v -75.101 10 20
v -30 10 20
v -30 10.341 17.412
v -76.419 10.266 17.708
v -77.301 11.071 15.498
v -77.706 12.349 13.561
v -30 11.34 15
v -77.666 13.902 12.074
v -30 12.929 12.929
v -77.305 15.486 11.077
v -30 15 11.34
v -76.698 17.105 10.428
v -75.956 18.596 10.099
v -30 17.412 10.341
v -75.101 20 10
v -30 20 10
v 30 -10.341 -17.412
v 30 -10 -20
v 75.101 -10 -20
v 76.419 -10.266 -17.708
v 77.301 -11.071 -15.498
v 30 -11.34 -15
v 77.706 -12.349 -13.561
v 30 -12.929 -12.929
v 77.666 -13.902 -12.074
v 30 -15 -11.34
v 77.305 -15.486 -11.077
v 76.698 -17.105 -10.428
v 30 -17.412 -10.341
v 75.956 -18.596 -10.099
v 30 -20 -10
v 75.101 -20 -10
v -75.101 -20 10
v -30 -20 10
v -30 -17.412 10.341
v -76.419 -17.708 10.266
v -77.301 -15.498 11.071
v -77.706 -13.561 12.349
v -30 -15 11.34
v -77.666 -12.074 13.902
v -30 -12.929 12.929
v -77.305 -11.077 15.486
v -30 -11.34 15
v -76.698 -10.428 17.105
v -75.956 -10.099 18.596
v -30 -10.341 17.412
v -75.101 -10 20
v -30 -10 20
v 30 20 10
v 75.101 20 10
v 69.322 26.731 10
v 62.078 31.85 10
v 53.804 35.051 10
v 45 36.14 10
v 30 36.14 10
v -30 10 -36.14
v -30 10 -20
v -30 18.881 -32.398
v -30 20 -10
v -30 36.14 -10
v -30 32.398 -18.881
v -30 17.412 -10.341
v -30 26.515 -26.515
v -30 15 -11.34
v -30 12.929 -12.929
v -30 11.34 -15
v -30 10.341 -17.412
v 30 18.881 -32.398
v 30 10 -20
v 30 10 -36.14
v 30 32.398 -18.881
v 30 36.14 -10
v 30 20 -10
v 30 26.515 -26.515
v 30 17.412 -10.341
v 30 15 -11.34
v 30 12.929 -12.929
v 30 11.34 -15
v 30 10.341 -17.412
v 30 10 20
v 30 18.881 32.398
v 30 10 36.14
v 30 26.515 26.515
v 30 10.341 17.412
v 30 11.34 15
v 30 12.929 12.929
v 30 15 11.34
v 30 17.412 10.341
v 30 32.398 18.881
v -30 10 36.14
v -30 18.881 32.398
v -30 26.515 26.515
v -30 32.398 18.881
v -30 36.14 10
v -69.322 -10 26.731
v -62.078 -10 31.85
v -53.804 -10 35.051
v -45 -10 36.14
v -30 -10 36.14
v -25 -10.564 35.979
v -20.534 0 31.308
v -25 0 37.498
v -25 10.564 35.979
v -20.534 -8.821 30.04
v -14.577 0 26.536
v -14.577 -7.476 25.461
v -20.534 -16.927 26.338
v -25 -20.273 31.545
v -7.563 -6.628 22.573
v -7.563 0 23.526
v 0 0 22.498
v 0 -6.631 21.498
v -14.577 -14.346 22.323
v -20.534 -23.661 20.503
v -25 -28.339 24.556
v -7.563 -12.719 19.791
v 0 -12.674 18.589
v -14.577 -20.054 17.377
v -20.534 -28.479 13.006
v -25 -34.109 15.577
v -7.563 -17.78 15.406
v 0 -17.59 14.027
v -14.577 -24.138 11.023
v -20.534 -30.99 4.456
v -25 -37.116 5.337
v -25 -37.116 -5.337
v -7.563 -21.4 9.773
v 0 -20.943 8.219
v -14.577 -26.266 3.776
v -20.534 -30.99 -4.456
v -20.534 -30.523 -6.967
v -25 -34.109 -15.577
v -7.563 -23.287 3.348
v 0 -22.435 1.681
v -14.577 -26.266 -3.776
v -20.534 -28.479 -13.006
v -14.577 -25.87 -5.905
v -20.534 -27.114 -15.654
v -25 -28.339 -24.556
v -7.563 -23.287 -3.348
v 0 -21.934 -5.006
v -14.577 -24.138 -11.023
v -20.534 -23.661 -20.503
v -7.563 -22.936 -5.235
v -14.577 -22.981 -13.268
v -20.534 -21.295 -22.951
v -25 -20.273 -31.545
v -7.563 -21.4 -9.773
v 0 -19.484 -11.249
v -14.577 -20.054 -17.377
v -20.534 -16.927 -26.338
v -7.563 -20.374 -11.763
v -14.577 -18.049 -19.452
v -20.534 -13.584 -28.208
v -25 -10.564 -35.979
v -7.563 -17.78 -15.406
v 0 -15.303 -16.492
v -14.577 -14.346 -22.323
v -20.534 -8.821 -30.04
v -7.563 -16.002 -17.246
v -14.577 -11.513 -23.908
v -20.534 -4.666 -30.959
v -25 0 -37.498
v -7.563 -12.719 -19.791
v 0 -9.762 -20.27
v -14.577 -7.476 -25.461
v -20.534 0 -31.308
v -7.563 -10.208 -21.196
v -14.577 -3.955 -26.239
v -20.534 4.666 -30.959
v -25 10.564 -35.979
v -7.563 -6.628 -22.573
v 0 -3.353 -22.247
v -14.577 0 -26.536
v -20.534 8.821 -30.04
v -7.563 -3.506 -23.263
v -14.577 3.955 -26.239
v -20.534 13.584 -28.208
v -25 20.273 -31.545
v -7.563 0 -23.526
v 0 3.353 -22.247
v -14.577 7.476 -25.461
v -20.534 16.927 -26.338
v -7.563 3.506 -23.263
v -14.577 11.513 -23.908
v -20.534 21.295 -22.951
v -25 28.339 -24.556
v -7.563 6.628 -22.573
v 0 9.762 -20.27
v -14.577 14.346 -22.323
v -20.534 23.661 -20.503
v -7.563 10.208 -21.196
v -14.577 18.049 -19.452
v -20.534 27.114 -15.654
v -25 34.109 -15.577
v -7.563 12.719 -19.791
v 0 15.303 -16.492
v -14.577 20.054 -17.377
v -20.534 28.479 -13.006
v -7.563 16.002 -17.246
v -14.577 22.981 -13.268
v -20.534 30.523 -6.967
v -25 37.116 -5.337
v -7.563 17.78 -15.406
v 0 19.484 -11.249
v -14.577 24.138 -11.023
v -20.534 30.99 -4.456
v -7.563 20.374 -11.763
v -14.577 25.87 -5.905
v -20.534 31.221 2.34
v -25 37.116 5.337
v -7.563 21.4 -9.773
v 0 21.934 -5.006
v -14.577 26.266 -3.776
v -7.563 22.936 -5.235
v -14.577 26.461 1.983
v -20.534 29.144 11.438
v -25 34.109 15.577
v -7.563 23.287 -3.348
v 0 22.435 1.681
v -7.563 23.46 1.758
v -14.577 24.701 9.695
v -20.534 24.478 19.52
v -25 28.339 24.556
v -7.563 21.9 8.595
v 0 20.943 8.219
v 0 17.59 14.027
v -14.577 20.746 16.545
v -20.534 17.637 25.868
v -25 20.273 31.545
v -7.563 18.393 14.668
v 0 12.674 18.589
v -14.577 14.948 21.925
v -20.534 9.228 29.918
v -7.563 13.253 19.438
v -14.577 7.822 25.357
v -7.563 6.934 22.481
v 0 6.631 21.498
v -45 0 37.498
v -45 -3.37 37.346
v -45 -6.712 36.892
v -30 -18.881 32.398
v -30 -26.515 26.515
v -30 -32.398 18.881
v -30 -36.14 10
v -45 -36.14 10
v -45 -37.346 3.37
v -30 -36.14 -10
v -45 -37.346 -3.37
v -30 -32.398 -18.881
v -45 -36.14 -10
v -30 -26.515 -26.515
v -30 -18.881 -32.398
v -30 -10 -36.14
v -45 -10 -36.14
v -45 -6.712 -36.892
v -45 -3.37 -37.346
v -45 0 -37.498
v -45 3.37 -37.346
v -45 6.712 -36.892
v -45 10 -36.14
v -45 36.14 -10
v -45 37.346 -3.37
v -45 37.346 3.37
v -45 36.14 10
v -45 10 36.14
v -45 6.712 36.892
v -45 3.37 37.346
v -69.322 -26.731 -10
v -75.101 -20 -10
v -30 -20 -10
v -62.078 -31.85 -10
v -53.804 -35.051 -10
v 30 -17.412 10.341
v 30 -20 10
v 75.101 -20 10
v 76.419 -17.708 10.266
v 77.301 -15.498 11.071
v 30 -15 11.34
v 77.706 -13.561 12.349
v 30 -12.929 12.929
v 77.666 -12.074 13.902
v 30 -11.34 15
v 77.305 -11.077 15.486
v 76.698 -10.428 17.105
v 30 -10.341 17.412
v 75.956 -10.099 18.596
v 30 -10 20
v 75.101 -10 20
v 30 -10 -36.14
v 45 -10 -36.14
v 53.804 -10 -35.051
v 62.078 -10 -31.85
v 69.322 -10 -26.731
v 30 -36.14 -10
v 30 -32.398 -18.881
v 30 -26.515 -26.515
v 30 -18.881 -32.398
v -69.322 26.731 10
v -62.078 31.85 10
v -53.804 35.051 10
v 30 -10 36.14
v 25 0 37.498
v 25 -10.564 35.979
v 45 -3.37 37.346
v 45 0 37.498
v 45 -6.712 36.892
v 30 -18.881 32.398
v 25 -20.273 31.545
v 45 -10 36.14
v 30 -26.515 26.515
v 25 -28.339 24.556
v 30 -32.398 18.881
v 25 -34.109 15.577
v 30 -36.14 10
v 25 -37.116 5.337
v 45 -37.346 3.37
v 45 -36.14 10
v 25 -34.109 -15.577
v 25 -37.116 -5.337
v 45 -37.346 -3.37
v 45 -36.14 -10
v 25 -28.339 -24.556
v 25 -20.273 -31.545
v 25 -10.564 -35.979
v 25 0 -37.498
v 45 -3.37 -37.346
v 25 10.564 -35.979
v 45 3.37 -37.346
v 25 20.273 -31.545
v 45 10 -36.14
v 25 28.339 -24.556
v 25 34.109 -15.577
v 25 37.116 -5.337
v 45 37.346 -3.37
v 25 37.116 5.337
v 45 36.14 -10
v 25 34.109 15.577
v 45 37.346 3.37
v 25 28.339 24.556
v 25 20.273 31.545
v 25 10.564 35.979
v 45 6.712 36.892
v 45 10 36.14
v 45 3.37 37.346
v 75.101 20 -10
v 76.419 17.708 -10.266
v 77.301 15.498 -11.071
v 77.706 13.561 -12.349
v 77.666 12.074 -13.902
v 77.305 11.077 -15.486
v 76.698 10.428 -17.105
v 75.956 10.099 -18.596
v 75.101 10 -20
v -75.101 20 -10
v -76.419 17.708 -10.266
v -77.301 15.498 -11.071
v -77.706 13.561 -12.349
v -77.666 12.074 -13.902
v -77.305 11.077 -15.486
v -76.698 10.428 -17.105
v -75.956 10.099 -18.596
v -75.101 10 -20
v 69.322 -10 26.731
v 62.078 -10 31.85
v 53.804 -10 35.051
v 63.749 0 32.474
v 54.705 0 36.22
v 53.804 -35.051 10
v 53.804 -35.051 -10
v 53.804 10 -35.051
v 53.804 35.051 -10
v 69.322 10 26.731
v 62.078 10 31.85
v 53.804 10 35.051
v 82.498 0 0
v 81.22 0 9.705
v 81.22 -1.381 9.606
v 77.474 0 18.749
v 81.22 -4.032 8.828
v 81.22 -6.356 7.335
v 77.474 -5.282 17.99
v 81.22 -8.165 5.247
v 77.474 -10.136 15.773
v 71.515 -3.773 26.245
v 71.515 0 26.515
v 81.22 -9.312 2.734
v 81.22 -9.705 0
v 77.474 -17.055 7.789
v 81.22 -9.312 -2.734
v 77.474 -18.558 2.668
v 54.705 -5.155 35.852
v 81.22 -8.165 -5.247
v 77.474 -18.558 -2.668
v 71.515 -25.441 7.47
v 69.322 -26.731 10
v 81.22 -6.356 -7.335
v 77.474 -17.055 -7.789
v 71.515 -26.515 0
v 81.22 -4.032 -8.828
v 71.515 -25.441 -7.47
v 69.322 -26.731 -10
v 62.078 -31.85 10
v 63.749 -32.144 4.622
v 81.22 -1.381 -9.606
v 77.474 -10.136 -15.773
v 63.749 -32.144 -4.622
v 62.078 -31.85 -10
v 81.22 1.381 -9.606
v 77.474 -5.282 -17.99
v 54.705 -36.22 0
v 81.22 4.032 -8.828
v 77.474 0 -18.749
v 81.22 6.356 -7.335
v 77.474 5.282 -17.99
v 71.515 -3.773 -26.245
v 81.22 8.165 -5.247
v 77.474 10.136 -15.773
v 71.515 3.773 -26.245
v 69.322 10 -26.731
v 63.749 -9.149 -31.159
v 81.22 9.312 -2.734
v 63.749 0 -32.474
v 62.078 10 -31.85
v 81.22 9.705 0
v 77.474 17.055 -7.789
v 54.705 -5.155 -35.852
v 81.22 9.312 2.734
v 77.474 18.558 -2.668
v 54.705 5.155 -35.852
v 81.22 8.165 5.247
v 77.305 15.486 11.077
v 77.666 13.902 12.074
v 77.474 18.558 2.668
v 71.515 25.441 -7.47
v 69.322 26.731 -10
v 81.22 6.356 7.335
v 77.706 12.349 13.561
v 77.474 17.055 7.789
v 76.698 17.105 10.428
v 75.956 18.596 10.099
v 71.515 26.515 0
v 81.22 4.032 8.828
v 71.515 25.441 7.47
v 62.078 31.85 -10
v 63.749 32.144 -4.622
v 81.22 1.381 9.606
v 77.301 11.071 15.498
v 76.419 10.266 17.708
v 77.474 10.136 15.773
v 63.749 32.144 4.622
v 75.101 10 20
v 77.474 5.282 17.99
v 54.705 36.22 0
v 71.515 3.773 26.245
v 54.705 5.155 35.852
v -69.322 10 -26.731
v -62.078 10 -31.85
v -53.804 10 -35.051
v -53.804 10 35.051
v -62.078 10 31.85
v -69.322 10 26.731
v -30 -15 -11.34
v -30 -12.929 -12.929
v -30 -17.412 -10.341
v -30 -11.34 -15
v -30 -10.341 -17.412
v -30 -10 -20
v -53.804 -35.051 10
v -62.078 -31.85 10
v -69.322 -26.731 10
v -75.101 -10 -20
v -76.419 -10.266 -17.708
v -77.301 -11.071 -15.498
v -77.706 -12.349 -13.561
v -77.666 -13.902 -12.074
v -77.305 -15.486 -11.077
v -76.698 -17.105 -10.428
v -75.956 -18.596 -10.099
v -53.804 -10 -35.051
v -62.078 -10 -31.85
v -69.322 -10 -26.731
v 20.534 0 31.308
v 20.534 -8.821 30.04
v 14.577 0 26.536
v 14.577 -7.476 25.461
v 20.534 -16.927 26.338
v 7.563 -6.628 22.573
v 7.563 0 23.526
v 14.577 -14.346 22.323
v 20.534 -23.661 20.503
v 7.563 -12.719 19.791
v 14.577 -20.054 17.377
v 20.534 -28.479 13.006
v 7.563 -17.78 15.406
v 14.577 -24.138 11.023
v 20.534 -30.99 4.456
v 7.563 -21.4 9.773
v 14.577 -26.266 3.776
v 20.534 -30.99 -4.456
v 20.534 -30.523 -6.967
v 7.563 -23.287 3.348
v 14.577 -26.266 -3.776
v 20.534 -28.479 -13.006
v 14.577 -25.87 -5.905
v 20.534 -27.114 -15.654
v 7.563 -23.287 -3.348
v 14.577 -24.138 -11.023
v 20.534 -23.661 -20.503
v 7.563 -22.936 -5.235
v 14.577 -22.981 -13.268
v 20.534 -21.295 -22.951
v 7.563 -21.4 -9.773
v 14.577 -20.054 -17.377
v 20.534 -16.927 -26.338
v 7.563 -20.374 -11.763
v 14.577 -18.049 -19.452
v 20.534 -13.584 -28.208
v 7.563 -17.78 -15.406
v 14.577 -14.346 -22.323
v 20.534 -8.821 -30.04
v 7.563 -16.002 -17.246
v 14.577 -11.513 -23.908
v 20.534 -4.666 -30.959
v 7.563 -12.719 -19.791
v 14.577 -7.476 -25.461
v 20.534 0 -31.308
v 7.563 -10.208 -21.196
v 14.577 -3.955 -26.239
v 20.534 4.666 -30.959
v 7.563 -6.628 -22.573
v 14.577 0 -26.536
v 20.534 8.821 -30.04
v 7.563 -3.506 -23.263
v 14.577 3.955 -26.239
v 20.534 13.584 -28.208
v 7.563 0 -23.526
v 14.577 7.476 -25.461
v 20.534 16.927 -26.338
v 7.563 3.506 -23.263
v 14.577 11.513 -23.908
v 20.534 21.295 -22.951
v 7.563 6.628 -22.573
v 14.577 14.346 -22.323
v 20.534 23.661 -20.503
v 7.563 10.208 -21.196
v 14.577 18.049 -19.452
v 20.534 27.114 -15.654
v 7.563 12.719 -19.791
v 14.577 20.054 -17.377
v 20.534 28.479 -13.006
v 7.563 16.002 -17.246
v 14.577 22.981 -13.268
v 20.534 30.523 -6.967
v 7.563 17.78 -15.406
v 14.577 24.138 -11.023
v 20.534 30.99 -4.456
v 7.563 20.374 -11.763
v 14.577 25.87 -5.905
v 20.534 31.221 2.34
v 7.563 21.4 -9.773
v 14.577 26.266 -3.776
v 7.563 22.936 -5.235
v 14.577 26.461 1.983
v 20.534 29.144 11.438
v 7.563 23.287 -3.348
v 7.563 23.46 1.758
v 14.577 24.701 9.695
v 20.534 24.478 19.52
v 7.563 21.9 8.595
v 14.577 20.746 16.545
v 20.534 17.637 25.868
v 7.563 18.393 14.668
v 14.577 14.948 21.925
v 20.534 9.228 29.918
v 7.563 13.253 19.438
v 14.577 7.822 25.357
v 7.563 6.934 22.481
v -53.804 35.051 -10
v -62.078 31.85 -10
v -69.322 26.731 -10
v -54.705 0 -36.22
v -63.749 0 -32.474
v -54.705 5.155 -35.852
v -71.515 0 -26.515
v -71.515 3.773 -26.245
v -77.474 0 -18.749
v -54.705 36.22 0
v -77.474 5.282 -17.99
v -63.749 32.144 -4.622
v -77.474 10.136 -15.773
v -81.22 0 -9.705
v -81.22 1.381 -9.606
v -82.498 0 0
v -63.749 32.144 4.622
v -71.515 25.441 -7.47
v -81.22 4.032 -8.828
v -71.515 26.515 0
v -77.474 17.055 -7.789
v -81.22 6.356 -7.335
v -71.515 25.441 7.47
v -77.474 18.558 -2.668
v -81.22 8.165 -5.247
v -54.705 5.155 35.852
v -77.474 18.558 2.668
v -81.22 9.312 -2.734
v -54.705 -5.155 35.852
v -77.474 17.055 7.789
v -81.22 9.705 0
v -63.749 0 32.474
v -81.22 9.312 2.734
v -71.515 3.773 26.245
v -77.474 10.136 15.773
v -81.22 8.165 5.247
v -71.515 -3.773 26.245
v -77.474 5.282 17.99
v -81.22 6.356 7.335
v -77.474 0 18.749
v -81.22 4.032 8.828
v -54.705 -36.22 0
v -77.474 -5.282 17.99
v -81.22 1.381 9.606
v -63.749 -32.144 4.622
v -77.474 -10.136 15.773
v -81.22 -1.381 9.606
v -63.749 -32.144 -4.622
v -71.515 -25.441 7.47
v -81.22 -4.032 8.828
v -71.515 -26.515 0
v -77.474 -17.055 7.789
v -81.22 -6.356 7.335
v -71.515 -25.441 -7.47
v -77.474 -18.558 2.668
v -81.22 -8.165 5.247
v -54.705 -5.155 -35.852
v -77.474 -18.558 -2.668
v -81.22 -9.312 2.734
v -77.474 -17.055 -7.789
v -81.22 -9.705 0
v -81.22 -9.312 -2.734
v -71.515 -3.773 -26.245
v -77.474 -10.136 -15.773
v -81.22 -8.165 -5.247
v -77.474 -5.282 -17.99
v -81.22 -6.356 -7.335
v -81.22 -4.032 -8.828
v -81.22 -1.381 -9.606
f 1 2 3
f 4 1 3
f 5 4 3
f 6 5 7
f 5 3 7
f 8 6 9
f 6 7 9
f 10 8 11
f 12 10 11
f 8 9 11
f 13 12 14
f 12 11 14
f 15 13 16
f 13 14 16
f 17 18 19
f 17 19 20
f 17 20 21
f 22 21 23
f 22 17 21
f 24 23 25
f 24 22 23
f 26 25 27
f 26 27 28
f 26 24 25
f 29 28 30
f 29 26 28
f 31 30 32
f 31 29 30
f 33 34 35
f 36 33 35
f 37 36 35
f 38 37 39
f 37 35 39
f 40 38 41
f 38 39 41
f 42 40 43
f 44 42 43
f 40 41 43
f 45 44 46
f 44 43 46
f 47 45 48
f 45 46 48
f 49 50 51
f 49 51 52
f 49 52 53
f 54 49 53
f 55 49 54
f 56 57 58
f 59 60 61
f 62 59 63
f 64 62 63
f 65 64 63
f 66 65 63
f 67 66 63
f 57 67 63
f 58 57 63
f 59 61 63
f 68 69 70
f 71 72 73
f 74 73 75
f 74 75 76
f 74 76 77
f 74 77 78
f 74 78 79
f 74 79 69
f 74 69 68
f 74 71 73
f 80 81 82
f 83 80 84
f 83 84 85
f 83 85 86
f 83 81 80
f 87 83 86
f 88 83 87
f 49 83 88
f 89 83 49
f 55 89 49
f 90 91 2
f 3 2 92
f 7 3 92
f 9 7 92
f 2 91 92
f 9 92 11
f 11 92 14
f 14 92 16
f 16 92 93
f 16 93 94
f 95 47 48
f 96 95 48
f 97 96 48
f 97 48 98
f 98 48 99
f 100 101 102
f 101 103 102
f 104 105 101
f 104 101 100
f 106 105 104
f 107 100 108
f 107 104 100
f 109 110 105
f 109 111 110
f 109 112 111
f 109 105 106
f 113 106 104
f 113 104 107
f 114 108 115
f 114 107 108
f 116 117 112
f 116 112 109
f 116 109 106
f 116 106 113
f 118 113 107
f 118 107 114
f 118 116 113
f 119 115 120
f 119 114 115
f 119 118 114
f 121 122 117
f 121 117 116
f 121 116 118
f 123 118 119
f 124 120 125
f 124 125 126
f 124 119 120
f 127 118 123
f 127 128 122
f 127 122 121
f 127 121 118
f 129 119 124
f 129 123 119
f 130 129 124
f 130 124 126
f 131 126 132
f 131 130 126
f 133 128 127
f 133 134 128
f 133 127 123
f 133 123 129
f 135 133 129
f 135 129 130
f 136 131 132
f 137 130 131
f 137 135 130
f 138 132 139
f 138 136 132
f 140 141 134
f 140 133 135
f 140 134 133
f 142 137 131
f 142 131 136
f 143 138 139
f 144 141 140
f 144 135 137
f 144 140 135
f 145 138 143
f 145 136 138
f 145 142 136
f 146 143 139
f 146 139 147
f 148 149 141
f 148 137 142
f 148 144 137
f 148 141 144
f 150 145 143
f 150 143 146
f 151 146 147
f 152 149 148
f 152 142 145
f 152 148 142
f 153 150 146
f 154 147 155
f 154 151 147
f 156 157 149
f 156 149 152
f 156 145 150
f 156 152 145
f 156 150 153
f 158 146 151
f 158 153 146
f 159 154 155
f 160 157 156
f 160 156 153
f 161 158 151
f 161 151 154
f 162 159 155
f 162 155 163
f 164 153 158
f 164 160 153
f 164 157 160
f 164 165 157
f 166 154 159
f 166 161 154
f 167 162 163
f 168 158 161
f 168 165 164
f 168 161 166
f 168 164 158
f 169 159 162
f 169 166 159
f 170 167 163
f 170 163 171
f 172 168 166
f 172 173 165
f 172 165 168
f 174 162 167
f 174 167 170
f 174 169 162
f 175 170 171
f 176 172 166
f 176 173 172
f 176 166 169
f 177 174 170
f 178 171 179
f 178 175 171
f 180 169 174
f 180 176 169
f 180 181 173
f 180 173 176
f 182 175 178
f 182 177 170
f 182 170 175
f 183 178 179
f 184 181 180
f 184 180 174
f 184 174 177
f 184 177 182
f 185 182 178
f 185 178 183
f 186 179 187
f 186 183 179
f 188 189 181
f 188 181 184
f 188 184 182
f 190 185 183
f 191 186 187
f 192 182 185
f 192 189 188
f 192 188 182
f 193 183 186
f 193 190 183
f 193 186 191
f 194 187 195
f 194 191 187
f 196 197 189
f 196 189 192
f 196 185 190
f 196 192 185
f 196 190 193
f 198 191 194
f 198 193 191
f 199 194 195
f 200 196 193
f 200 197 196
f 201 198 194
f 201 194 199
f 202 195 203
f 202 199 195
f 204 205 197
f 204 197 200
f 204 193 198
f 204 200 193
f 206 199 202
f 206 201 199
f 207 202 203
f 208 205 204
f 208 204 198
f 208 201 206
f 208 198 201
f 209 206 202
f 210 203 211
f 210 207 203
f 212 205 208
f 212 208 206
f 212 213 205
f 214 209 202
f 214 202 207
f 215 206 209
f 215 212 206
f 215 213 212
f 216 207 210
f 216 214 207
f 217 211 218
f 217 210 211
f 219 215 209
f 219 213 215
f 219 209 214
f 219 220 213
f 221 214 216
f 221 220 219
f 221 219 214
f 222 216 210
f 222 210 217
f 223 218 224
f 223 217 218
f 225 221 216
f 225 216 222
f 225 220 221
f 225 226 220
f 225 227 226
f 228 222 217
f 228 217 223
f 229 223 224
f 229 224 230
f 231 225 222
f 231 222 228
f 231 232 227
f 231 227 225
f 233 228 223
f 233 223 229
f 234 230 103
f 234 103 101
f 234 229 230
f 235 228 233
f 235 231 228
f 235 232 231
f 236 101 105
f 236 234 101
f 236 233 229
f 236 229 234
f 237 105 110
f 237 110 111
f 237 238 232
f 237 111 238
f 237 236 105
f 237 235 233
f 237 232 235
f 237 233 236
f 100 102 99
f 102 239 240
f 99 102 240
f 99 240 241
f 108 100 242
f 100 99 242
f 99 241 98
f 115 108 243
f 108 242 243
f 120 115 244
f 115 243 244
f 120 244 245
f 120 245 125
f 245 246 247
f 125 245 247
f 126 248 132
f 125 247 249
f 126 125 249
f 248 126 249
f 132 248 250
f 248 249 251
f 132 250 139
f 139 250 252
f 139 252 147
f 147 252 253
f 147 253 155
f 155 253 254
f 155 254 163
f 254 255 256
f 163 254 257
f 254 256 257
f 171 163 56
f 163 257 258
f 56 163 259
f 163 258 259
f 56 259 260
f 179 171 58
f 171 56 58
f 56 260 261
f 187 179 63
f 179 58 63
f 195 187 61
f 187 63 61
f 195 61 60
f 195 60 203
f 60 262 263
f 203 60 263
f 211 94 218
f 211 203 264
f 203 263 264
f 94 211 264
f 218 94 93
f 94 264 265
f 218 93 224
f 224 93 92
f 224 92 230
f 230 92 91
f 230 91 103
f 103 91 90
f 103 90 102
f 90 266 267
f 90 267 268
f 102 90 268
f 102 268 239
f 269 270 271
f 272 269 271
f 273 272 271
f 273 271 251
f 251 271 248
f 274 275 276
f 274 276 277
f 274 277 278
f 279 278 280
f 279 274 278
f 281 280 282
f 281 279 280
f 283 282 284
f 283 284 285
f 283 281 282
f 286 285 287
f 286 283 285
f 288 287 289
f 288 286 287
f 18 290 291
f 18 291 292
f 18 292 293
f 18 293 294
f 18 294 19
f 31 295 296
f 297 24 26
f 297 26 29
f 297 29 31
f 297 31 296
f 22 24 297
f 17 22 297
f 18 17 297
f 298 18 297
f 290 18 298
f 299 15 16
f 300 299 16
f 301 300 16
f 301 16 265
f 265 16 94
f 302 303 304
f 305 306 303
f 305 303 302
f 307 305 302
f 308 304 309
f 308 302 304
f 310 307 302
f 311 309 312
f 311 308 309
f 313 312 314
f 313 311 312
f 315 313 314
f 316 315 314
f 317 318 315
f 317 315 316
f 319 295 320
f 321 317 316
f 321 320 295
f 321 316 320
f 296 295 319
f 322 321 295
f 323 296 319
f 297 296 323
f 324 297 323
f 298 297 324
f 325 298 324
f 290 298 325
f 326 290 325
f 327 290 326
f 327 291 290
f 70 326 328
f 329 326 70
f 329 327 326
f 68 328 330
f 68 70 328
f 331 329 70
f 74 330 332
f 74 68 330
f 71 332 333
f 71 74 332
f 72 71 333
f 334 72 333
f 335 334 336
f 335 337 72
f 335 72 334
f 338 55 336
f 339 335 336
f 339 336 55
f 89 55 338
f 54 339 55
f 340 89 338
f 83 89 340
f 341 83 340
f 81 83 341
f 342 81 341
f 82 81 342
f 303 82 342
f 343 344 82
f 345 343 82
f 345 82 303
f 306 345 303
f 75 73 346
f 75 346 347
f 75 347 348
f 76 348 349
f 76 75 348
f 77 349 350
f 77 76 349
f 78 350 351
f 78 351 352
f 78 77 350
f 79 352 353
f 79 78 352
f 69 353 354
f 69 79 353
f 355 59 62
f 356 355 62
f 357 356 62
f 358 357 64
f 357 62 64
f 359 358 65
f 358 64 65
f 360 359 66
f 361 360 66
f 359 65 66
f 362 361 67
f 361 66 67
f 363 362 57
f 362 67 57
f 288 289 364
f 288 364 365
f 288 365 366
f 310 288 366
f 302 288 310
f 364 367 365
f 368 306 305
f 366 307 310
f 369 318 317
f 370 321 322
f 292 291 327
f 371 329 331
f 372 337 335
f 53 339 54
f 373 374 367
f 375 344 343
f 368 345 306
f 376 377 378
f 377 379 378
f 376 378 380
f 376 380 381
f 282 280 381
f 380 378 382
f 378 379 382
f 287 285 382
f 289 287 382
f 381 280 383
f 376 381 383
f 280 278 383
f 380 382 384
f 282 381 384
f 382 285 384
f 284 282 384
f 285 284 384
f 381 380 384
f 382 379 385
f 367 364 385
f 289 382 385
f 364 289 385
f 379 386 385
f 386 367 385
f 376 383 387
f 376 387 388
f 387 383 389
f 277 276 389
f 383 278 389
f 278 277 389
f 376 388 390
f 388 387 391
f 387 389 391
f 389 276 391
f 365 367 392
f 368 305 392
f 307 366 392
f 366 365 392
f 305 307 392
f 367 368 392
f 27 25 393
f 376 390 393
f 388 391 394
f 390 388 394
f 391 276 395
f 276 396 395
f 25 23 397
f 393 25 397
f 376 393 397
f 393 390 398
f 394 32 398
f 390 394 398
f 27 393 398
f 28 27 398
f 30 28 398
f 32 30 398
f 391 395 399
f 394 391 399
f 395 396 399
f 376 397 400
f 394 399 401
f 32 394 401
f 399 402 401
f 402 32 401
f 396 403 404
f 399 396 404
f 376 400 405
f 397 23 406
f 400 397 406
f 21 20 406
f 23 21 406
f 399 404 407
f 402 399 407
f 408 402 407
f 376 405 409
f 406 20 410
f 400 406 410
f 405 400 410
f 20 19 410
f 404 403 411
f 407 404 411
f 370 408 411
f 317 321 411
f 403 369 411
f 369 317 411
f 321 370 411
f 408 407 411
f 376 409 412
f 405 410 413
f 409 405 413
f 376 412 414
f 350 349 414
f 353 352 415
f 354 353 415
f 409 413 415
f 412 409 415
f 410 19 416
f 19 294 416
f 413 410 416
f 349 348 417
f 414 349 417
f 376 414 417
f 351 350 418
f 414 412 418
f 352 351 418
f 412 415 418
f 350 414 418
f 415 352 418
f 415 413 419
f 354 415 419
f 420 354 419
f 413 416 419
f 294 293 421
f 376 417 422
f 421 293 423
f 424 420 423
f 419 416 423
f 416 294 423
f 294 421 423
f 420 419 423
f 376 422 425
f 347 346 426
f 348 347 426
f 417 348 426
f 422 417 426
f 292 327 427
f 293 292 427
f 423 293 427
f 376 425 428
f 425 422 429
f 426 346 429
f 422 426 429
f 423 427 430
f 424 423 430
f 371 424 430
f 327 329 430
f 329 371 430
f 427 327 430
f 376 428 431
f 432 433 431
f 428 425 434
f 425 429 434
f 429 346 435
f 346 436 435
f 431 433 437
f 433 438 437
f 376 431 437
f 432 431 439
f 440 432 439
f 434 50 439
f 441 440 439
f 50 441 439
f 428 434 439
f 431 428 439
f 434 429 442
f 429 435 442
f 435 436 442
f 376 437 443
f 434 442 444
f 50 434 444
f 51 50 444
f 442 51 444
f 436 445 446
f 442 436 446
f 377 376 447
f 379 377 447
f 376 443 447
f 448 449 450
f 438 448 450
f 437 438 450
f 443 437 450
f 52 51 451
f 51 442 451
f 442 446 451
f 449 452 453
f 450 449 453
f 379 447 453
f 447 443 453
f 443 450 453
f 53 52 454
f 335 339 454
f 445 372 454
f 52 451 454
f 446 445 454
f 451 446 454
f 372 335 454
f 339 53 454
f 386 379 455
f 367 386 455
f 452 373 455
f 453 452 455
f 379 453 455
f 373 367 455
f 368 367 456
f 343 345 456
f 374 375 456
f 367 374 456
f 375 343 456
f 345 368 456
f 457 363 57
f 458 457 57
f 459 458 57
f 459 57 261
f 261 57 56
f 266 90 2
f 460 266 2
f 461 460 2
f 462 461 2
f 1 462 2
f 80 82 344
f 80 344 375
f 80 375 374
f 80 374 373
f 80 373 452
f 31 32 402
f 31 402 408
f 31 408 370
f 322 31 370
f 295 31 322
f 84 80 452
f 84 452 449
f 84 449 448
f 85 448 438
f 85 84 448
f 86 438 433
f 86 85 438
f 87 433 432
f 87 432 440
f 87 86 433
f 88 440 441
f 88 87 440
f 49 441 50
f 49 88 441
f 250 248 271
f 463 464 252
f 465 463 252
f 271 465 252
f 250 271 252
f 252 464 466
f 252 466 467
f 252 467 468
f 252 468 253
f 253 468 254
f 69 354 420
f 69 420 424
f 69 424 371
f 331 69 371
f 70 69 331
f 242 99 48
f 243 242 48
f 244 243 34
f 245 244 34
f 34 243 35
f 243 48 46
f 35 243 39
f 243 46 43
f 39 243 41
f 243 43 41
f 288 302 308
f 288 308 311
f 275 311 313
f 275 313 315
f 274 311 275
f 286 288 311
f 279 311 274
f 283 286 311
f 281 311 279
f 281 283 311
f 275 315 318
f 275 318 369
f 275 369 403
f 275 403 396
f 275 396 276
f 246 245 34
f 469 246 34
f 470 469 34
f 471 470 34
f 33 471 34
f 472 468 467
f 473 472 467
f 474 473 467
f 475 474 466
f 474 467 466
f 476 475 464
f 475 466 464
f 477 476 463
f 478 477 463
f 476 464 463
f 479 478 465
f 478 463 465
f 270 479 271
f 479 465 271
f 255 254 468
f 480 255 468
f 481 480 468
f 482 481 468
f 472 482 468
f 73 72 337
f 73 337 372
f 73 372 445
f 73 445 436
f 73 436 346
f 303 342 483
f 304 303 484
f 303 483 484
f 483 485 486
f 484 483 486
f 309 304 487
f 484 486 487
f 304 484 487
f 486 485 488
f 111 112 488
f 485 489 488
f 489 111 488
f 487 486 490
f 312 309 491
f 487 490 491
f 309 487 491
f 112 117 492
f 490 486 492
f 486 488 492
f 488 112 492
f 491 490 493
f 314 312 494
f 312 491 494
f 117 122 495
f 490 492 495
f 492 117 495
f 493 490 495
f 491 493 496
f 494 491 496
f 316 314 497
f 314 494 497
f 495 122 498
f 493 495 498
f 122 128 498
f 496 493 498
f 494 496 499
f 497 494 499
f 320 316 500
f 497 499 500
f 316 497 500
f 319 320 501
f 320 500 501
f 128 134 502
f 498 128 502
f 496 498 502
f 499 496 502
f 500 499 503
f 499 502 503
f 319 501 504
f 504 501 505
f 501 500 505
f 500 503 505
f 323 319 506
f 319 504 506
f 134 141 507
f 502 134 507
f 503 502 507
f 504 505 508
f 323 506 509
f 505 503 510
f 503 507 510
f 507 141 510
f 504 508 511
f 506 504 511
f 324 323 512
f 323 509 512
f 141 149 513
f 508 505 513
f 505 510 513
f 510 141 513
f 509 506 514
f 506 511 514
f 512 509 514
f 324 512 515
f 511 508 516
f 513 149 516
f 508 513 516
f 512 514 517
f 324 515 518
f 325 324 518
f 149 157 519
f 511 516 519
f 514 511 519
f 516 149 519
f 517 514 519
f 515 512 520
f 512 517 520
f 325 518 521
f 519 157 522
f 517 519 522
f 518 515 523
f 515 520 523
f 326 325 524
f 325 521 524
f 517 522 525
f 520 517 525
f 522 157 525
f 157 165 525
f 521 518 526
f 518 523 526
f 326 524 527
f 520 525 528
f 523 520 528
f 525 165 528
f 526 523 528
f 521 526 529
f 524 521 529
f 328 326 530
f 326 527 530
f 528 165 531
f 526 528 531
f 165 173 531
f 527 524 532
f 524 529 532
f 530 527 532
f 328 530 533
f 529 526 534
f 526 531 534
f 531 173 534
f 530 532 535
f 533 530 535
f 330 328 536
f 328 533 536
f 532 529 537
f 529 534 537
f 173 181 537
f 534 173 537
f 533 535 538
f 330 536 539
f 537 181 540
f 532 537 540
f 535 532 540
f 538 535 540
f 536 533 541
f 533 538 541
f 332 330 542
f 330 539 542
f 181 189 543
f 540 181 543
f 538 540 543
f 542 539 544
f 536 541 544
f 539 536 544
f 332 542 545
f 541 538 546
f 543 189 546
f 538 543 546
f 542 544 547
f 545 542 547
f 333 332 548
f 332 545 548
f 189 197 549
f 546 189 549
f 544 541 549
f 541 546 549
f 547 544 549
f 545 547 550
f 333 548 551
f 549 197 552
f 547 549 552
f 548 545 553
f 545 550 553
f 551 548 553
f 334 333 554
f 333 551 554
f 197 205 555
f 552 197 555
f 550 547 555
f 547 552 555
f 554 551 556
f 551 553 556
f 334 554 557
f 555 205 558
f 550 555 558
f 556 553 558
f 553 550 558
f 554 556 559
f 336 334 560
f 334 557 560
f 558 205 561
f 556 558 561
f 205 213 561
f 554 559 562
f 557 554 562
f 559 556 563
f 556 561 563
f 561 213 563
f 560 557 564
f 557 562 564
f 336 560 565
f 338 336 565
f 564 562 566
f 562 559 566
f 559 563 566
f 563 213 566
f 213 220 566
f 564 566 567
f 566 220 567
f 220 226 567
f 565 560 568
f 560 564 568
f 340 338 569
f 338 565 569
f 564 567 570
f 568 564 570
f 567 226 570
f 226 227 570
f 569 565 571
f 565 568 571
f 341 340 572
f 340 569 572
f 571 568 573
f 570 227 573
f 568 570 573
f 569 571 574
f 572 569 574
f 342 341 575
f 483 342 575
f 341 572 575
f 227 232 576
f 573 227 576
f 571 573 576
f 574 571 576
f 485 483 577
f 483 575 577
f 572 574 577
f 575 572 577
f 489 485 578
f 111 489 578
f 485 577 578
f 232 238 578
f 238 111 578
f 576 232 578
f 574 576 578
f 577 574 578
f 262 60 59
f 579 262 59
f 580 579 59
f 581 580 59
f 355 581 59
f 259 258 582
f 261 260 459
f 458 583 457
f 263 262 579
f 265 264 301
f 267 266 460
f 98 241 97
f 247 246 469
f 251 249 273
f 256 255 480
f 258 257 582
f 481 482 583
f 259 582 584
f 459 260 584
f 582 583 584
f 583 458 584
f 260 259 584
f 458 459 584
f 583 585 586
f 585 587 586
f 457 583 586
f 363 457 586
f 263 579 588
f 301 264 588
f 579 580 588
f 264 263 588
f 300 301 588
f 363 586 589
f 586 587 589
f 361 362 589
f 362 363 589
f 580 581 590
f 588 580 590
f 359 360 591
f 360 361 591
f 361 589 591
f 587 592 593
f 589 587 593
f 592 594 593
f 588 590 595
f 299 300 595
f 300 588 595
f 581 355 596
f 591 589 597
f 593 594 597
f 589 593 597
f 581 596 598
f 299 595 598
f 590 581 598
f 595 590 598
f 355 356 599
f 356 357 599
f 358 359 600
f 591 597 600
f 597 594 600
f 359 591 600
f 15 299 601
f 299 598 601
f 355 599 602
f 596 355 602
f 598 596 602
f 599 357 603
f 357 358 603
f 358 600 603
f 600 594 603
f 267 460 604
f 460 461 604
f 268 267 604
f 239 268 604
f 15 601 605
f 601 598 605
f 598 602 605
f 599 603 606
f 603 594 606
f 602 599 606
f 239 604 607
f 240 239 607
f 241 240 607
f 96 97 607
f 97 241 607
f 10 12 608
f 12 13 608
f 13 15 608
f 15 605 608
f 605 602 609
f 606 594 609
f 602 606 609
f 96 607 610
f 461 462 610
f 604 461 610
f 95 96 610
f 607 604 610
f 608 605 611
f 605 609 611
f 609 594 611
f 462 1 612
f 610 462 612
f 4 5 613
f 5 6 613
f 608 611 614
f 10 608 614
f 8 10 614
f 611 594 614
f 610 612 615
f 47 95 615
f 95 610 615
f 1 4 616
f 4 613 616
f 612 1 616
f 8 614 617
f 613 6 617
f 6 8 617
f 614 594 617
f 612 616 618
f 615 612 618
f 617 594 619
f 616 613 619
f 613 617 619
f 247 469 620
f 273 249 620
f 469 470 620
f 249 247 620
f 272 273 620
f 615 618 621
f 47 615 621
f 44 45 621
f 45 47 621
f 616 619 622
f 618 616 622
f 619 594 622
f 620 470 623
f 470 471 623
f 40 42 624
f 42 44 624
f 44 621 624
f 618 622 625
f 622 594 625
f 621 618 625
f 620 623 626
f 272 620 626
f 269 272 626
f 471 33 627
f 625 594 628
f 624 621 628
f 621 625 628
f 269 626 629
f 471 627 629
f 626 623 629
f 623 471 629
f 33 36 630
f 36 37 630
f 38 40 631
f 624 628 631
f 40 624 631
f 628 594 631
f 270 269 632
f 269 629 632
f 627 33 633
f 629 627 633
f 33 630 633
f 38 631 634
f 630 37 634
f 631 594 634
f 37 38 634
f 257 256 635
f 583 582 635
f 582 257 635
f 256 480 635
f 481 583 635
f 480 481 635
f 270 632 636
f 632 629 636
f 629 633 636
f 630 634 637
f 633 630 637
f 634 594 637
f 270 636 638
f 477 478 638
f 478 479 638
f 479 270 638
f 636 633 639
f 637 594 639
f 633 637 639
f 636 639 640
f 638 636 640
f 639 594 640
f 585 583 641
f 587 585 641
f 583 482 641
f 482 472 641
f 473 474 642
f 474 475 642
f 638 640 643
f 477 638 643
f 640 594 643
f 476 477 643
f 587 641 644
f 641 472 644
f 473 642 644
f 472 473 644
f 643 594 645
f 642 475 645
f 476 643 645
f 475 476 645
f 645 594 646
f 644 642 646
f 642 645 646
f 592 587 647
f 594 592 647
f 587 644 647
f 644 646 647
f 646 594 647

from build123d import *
from build123d.topology import SkipClean

# Parameters (mm, degrees)
CUT_EXTRUDE_START   = -30
CUT_EXTRUDE_1_DEPTH = 52.5


with BuildPart() as part:
    # 草图1 → 旋转3 (revolve)
    with BuildSketch(Plane.XY):
        with BuildLine():
            Line((0, 0), (82.497986241, 0))
            ThreePointArc((82.497986241, 0), (71.515080352, 26.515080352), (45, 37.497986241))
            Line((45, 37.497986241), (25, 37.497986241))
            ThreePointArc((25, 37.497986241), (14.577379737, 26.535686679), (0, 22.497986241))
            Line((0, 22.497986241), (0, 0))
        make_face()
    revolve_3 = revolve(axis=Axis((82.497986241, 0, 0), (1, 0, 0)))

    # 草图2 → 切除-拉伸1 (cut)
    with BuildSketch(Plane.ZY.offset(CUT_EXTRUDE_START)):
        with BuildLine():
            Line((-10, 36.139991314), (-10, 20))
            ThreePointArc((-10, 20), (-12.928932188, 12.928932188), (-20, 10))
            Line((-20, 10), (-36.139991314, 10))
            ThreePointArc((-36.139991314, 10), (-26.515080352, 26.515080352), (-10, 36.139991314))
        make_face()
        with BuildLine():
            Line((36.139991314, 10), (20, 10))
            ThreePointArc((20, 10), (12.928932188, 12.928932188), (10, 20))
            Line((10, 20), (10, 36.139991314))
            ThreePointArc((10, 36.139991314), (26.515080352, 26.515080352), (36.139991314, 10))
        make_face()
        with BuildLine():
            Line((10, -36.139991314), (10, -20))
            ThreePointArc((10, -20), (12.928932188, -12.928932188), (20, -10))
            Line((20, -10), (36.139991314, -10))
            ThreePointArc((36.139991314, -10), (26.515080352, -26.515080352), (10, -36.139991314))
        make_face()
        with BuildLine():
            Line((-36.139991314, -10), (-20, -10))
            ThreePointArc((-20, -10), (-12.928932188, -12.928932188), (-10, -20))
            Line((-10, -20), (-10, -36.139991314))
            ThreePointArc((-10, -36.139991314), (-26.515080352, -26.515080352), (-36.139991314, -10))
        make_face()
    cut_extrude_1 = extrude(amount=-CUT_EXTRUDE_1_DEPTH, mode=Mode.SUBTRACT)

    # 镜向1: 旋转3, 切除-拉伸1 across plane
    with SkipClean():  # the faces are left unmerged after this step: merging them gives an invalid solid
        add(revolve_3.mirror(Plane(origin=(0, 0, 0), x_dir=(0, 0, 1), z_dir=(1, 0, 0))))
        add(cut_extrude_1.mirror(Plane(origin=(0, 0, 0), x_dir=(0, 0, 1), z_dir=(1, 0, 0))), mode=Mode.SUBTRACT)


solid = part.part
